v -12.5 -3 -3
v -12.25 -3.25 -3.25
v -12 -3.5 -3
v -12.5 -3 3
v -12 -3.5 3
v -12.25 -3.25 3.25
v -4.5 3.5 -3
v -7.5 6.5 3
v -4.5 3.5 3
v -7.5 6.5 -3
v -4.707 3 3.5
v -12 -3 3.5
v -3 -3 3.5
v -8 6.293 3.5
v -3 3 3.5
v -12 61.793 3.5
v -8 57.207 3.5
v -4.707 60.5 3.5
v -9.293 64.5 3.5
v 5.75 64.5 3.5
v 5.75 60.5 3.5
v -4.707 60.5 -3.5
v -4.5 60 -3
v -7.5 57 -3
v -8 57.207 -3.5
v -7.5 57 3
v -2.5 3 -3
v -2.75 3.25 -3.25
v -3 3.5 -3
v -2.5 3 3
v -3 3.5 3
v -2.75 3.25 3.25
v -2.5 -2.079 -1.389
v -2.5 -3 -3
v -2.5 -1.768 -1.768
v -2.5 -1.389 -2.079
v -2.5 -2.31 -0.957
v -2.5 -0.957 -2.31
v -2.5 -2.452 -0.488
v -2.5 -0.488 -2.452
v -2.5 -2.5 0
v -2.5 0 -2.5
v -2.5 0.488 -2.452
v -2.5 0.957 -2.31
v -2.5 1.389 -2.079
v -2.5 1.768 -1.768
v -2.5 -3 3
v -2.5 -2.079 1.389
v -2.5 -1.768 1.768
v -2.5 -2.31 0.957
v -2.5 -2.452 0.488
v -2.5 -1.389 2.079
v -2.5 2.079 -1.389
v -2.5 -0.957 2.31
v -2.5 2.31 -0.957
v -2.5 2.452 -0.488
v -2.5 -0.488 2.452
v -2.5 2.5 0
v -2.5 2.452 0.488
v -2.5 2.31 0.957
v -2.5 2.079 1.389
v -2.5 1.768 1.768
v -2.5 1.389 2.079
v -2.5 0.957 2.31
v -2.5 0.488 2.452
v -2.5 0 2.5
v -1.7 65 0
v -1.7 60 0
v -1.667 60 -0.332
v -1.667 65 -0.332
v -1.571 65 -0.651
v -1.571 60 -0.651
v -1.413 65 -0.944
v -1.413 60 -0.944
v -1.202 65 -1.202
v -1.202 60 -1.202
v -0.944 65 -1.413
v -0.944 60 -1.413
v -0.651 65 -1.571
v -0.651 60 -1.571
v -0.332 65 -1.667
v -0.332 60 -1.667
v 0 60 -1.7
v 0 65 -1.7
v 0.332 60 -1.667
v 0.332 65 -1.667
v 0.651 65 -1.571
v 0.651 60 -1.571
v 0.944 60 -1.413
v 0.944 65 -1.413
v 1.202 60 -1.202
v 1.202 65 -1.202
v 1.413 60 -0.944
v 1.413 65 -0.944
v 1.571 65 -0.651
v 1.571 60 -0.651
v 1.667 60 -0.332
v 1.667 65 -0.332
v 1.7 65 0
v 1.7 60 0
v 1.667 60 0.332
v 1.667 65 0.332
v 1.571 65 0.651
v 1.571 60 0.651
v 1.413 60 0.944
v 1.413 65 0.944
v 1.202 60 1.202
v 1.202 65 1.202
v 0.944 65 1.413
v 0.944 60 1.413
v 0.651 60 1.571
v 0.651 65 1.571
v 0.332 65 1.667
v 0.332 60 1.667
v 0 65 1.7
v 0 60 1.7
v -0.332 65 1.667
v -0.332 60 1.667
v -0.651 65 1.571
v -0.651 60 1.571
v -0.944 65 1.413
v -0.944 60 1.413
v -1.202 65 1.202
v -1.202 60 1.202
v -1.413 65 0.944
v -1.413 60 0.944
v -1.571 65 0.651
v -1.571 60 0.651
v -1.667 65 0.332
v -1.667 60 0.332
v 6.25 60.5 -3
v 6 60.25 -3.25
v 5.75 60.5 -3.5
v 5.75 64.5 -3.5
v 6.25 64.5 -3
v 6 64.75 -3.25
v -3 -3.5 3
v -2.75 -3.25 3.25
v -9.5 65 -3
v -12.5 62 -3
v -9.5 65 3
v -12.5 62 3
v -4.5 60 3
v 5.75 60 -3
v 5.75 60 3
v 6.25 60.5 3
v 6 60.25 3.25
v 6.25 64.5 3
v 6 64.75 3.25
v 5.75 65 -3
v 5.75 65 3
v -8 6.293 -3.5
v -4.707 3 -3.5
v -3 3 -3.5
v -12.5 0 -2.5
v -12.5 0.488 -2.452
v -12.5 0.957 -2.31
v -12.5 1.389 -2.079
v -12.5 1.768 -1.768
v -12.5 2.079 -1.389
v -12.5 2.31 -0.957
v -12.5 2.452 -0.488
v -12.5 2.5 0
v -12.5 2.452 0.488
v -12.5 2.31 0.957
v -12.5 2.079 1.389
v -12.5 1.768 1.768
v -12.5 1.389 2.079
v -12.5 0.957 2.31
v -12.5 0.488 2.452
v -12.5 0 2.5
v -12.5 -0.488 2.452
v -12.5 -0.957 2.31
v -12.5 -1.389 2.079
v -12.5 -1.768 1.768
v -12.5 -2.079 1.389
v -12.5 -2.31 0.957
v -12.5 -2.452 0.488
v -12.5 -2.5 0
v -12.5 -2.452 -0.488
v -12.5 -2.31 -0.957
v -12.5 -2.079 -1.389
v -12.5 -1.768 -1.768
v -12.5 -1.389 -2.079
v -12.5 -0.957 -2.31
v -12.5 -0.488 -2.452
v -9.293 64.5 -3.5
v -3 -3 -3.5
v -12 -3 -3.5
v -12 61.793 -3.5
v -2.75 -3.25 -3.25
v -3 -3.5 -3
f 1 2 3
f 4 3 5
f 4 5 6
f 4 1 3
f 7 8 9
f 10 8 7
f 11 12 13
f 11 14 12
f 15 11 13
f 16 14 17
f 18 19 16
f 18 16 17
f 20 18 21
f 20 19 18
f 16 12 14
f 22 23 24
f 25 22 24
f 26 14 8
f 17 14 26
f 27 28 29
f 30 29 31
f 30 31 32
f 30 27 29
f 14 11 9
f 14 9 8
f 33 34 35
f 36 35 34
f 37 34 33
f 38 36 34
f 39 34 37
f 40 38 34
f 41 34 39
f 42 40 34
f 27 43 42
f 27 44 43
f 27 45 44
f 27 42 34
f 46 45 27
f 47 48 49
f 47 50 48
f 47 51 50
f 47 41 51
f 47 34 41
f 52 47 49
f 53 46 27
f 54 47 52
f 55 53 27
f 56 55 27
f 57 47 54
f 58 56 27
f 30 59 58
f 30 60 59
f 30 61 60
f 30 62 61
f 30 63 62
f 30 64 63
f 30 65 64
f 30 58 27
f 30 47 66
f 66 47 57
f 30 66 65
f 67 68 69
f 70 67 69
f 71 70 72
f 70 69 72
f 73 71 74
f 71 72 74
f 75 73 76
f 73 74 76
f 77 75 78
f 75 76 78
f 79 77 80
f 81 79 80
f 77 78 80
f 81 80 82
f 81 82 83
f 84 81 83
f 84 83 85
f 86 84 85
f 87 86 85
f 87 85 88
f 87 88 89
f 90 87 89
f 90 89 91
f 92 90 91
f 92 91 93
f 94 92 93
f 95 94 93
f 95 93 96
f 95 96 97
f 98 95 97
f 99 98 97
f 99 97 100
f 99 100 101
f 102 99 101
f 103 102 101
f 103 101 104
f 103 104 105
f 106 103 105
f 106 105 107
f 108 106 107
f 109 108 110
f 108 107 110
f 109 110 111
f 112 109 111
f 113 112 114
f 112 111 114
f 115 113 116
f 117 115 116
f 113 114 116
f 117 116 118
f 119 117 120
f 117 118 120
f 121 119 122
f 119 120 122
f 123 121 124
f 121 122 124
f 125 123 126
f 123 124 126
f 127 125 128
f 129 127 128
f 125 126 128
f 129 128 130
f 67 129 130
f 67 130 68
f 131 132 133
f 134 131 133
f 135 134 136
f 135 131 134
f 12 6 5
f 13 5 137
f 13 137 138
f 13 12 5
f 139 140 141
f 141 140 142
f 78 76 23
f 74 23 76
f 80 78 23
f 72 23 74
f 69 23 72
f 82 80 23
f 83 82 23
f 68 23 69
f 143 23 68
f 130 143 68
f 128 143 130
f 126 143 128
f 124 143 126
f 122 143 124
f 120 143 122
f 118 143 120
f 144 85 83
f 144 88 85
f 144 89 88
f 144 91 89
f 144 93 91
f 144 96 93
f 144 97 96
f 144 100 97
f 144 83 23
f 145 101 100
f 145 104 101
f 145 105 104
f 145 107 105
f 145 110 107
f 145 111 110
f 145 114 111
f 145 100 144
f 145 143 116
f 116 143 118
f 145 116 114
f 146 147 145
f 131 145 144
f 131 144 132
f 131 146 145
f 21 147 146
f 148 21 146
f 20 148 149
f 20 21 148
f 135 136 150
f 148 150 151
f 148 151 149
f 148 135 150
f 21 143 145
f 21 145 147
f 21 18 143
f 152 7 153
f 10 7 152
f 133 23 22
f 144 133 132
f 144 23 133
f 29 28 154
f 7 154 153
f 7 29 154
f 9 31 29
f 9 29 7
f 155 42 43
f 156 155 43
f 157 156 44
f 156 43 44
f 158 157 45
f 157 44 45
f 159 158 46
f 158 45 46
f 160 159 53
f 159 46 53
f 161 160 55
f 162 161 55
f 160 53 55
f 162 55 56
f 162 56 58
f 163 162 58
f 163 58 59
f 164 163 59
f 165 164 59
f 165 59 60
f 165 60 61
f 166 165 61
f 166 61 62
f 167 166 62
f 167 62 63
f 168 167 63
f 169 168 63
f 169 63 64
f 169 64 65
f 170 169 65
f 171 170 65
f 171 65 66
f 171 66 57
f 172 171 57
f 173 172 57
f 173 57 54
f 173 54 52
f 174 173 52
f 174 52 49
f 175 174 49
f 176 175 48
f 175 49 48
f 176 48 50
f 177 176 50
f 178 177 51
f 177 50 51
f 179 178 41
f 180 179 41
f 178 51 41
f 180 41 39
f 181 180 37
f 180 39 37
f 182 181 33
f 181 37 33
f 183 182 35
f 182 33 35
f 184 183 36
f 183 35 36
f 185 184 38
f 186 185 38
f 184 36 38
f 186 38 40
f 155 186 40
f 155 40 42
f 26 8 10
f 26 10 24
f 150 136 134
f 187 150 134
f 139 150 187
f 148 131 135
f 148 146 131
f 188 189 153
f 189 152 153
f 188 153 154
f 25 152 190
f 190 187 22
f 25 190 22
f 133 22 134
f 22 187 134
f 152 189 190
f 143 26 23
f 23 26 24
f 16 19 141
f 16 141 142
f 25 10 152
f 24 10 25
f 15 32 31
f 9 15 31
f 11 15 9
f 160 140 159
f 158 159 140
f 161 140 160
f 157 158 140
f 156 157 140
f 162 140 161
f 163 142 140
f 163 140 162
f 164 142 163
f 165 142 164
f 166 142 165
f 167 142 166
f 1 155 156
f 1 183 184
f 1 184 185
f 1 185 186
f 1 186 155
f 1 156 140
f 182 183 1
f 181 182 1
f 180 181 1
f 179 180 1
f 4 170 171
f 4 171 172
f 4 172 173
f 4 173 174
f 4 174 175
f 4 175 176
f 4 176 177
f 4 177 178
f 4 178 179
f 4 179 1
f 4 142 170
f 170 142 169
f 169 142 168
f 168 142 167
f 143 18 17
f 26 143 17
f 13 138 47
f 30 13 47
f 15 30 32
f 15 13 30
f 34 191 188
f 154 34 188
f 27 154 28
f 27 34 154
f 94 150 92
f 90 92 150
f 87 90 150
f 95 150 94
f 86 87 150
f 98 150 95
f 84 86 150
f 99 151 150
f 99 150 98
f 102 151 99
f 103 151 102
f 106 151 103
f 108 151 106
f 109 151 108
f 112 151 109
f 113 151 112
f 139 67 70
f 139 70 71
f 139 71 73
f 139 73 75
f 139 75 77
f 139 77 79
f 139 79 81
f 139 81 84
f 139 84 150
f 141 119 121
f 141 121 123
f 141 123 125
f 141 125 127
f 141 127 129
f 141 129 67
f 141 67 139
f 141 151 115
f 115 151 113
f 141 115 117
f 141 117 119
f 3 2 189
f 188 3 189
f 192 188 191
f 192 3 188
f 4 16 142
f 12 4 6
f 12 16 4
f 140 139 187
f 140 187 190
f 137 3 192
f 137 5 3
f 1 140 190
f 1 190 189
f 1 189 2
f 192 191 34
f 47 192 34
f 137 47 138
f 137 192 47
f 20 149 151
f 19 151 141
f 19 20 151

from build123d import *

# Parameters (mm, degrees)
SALIENTE_EXTRUIR1_DEPTH      = 3.5
CROQUIS2_R                   = 2.5
CORTAR_EXTRUIR1_DEPTH        = 7.25
CORTAR_EXTRUIR1_DEPTH_BACK   = 13.5
TALADRO_DE_MARGEN_PARA_M31_D = 3.4
CHAFL_N1_SIZE                = 3
CHAFL_N2_SIZE                = 0.5
CHAFL_N3_SIZE                = 0.5


with BuildPart() as part:
    # Croquis1 → Saliente-Extruir1 (new body, symmetric)
    with BuildSketch(Plane.XY):
        Polygon((6.25, 60), (6.25, 65), (0, 65), (-12.5, 65), (-12.5, 3.5), (-12.5, -3.5), (-2.5, -3.5), (-2.5, 3.5), (-7.5, 3.5), (-7.5, 60), (0, 60), align=None)
    extrude(amount=SALIENTE_EXTRUIR1_DEPTH, both=True)

    # Croquis2 → Cortar-Extruir1 (cut, two sides)
    with BuildSketch(Plane(origin=(0, 0, 0), x_dir=(0, 0, -1), z_dir=(1, 0, 0))) as cortar_extruir1_sk:
        Circle(CROQUIS2_R)
    extrude(amount=CORTAR_EXTRUIR1_DEPTH, mode=Mode.SUBTRACT)
    extrude(cortar_extruir1_sk.sketch, amount=-CORTAR_EXTRUIR1_DEPTH_BACK, mode=Mode.SUBTRACT)

    # Taladro de margen para M31 (through all)
    with Locations(Plane(origin=(0, 65, 0), x_dir=(1, 0, 0), z_dir=(0, 1, 0))):
        with Locations((0, 0)):
            Hole(TALADRO_DE_MARGEN_PARA_M31_D / 2)

    # Chaflán1
    chafl_n1_edges = [part.edges().sort_by_distance(p)[0] for p in [
        (-7.5, 60, 0),
        (-7.5, 3.5, 0),
        (-12.5, 65, 0),
    ]]
    chamfer(chafl_n1_edges, length=CHAFL_N1_SIZE)

    # Chaflán2
    chafl_n2_edges = [part.edges().sort_by_distance(p)[0] for p in [
        (-3.5, 3.5, -3.5),
        (-2.5, 0, -3.5),
        (-7.5, -3.5, -3.5),
        (6.25, 62.5, 3.5),
        (-12.5, 29.25, -3.5),
        (6.25, 62.5, -3.5),
        (-12.5, 29.25, 3.5),
        (-7.5, -3.5, 3.5),
        (-2.5, 0, 3.5),
        (-3.5, 3.5, 3.5),
        (-7.5, 31.75, -3.5),
        (-7.5, 31.75, 3.5),
        (0.875, 60, -3.5),
        (-1.625, 65, -3.5),
        (-11, 63.5, -3.5),
        (-1.625, 65, 3.5),
        (0.875, 60, 3.5),
        (-11, 63.5, 3.5),
        (-6, 5, -3.5),
        (-6, 5, 3.5),
        (-6, 58.5, -3.5),
        (-6, 58.5, 3.5),
    ]]
    chamfer(chafl_n2_edges, length=CHAFL_N2_SIZE)

    # Chaflán3
    chafl_n3_edges = [part.edges().sort_by_distance(p)[0] for p in [
        (-2.5, -3.5, 0),
        (-12.5, -3.5, 0),
        (-2.5, 3.5, 0),
        (6.25, 60, 0),
        (6.25, 65, 0),
    ]]
    chamfer(chafl_n3_edges, length=CHAFL_N3_SIZE)


solid = part.part
